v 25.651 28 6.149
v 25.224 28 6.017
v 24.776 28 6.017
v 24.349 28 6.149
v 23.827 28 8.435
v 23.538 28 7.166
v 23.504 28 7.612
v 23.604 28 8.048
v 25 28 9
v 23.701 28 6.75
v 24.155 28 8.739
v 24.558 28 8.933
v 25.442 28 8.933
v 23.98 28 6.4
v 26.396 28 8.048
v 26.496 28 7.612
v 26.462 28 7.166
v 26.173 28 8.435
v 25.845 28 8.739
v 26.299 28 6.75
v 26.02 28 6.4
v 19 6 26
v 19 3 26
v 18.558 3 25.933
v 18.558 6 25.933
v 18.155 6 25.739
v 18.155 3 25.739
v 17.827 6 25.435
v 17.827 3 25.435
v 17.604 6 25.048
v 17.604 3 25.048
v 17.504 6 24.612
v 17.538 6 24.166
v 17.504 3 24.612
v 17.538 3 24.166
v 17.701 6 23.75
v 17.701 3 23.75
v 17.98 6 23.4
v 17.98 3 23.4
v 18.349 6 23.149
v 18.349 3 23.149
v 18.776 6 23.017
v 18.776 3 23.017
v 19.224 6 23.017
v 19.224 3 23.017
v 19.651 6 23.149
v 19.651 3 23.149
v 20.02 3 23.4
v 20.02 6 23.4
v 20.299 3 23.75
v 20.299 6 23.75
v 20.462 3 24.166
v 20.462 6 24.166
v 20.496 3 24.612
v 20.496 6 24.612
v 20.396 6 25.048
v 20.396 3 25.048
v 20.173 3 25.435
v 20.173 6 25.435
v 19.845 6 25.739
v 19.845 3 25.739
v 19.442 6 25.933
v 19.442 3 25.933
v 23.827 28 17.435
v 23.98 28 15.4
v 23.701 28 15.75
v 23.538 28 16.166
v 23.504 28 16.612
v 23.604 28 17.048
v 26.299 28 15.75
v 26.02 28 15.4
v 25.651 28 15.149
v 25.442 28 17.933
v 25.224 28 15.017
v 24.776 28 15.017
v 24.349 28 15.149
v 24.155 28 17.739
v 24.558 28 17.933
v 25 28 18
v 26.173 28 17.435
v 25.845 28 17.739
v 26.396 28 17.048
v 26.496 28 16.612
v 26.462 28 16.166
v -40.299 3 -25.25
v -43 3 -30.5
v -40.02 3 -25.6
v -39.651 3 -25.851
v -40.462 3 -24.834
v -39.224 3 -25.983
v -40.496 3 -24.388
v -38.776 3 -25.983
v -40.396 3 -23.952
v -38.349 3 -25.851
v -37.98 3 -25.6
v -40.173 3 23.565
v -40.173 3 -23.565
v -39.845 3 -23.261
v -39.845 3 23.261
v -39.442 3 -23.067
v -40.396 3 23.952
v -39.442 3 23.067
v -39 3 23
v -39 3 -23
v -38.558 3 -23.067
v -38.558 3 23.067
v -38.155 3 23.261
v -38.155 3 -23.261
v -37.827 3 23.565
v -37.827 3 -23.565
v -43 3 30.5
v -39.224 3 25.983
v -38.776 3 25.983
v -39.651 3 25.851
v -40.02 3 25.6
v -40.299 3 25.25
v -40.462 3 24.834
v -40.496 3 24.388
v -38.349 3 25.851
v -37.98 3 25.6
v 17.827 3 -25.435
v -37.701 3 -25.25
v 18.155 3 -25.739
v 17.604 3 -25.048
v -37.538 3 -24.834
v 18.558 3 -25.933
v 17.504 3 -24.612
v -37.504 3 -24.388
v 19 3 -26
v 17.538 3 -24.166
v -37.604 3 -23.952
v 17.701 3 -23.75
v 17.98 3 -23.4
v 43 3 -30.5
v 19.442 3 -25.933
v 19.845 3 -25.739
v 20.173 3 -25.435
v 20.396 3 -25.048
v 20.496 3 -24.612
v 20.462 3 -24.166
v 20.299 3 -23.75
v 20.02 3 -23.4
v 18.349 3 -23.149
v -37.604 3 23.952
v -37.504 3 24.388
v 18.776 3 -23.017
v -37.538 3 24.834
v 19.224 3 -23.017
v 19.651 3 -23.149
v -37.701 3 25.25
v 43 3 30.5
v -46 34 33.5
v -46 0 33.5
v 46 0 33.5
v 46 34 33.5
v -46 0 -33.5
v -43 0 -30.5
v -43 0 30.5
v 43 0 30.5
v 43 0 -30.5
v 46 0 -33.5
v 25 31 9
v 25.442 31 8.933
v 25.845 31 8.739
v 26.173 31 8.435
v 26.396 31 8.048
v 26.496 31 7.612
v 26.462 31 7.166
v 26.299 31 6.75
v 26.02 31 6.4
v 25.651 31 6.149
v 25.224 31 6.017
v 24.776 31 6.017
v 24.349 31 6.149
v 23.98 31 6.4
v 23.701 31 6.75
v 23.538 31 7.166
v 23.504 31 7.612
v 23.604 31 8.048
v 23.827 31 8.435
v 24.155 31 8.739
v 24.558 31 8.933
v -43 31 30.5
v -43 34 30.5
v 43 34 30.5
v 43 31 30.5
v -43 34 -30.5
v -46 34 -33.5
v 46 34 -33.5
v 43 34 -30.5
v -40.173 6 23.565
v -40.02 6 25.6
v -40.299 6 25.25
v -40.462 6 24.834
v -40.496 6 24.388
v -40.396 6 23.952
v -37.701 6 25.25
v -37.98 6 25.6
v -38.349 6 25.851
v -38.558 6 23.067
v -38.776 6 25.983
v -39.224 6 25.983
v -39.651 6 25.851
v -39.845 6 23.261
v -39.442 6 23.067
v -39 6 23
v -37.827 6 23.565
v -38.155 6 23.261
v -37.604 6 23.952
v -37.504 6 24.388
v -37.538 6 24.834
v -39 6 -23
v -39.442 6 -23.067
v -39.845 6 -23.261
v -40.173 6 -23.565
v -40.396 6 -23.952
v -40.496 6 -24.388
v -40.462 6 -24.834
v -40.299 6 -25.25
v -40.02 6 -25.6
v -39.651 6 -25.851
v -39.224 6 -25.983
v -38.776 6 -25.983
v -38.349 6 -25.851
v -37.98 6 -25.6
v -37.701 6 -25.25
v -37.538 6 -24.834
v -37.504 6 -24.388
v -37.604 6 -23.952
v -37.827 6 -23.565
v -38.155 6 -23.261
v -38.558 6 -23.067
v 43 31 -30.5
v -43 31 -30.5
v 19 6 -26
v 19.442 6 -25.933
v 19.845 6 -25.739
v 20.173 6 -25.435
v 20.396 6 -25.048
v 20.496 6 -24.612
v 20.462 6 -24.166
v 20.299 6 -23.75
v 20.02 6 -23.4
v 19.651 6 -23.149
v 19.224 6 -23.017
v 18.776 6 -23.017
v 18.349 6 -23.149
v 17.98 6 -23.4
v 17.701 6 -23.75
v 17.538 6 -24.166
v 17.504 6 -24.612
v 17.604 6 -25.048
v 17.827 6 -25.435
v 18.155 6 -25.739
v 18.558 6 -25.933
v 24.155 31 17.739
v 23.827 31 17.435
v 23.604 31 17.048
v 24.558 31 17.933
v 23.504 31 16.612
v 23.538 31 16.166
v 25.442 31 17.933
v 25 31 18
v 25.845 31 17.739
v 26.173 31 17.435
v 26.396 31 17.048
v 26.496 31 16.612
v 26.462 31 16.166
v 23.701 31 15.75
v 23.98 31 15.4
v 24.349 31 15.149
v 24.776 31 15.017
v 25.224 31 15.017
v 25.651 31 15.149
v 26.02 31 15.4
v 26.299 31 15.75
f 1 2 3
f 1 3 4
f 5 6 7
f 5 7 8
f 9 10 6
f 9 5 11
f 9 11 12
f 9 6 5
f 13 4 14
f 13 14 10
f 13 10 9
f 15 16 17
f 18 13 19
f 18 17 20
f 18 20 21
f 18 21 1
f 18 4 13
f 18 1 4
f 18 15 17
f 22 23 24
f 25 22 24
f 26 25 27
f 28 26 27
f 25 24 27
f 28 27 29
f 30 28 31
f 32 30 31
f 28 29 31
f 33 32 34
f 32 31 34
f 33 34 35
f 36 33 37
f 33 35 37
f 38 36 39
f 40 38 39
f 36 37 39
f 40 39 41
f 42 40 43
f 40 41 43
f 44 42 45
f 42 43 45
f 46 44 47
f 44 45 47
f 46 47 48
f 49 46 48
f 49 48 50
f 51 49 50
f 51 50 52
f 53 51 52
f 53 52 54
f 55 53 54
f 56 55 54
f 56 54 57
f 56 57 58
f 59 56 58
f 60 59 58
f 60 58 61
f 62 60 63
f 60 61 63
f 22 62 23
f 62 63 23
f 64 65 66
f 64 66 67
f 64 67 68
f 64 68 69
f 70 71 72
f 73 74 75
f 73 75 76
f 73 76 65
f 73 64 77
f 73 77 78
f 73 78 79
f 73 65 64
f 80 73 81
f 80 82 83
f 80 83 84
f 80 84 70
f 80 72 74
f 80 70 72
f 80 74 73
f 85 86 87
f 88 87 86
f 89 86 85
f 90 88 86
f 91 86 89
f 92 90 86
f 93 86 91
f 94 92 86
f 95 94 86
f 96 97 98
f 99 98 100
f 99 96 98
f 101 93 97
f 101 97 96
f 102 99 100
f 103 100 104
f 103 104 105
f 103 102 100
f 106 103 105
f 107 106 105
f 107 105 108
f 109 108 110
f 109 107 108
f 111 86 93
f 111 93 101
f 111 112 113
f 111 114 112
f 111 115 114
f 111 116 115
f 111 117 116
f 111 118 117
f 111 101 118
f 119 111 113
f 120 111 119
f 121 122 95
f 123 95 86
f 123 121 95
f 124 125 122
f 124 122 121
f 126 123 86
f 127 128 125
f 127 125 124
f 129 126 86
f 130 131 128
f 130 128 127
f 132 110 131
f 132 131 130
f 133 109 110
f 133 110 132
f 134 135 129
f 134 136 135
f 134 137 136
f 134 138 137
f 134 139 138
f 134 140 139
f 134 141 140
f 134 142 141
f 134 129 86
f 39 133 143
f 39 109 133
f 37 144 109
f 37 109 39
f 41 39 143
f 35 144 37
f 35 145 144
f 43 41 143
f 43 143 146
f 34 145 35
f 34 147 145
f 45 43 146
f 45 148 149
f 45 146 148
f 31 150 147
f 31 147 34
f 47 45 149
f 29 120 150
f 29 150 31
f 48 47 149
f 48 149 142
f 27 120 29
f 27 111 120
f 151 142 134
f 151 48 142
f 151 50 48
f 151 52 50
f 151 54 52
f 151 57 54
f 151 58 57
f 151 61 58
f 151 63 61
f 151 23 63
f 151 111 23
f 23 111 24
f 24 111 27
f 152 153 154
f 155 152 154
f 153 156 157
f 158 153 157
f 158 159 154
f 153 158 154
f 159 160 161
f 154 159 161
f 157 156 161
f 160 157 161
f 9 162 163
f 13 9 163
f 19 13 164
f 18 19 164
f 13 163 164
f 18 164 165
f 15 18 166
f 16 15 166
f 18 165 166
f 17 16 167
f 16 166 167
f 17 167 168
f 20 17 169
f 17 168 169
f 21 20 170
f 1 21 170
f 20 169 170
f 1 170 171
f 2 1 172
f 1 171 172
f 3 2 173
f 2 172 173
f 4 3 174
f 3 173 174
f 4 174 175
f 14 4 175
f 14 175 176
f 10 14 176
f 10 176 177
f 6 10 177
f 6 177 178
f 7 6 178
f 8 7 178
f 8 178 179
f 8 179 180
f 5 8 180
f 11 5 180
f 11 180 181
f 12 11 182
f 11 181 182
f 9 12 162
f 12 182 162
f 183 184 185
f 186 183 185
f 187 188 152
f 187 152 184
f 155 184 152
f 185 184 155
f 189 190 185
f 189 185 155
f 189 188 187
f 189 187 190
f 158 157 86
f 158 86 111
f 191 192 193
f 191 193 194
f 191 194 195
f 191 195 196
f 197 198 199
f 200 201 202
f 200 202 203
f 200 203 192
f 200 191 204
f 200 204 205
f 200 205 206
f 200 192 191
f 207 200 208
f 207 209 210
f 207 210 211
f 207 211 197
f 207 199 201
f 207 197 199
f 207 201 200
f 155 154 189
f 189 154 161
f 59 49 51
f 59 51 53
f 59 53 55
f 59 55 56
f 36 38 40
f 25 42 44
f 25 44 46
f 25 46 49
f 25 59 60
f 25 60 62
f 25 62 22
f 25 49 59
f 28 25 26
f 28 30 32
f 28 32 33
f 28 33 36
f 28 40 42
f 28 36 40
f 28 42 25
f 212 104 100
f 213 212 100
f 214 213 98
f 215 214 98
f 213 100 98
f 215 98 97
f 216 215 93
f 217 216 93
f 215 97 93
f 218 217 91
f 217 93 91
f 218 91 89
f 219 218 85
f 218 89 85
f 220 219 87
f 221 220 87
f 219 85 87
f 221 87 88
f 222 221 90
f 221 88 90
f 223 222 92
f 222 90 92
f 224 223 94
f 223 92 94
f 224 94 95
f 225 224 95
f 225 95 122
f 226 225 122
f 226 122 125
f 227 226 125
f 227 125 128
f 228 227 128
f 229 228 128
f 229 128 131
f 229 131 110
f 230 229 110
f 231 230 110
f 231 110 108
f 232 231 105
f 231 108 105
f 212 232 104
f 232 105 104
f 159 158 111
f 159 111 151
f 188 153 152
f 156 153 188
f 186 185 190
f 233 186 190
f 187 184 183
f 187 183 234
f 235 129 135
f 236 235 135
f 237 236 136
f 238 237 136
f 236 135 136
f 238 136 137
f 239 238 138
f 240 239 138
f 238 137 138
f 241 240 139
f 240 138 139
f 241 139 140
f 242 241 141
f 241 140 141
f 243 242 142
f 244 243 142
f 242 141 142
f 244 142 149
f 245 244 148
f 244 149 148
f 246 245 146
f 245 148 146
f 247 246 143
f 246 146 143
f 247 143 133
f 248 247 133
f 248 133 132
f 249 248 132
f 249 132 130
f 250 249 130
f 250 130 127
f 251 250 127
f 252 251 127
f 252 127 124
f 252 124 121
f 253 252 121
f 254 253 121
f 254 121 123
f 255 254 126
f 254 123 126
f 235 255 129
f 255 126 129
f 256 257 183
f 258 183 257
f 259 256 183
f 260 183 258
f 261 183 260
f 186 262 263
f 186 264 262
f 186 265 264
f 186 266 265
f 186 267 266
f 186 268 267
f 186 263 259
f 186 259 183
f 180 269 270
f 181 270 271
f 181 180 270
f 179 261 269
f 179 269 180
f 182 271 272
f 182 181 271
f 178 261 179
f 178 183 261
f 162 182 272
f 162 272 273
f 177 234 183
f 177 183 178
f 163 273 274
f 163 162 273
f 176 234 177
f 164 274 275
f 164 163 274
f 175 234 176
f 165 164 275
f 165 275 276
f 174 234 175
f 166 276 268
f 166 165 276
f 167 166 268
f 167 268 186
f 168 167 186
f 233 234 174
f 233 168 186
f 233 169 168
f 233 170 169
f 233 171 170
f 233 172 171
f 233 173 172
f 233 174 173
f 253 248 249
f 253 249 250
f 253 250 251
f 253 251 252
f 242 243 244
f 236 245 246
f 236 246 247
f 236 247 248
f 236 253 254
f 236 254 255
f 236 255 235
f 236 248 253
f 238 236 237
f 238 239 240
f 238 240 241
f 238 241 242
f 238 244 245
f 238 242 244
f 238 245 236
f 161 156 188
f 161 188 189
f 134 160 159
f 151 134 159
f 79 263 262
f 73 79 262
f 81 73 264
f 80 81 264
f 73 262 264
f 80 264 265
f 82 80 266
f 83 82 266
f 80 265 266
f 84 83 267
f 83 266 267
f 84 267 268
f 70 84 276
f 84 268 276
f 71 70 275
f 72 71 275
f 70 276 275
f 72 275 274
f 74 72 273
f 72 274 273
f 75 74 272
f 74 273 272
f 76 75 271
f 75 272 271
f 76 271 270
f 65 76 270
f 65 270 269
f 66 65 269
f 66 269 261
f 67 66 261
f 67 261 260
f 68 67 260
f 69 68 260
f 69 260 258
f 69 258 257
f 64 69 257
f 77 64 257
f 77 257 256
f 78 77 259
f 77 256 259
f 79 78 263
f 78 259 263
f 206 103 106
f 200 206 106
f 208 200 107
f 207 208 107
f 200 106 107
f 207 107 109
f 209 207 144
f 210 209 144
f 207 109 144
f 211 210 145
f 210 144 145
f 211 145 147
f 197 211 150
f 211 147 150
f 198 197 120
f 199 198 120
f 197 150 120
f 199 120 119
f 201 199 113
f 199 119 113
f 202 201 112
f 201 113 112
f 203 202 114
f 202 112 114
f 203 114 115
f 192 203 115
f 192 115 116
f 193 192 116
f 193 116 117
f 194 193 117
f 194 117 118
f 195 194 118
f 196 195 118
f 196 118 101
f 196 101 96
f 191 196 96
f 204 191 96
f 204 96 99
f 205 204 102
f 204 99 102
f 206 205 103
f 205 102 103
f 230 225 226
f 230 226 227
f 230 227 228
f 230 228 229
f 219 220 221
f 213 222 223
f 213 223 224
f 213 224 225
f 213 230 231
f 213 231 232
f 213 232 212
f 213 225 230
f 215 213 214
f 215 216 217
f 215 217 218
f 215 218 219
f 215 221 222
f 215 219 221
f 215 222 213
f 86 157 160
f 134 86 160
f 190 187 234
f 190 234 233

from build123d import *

# Parameters (mm, degrees)
SKETCH_1_W          = 92
SKETCH_1_H          = 67
EXTRUDE_1_DEPTH     = 34
SKETCH_2_W          = 86
SKETCH_2_H          = 61
CUT_EXTRUDE_1_DEPTH = 3
SKETCH_3_R          = 1.5
CUT_EXTRUDE_2_DEPTH = 3
SKETCH_4_W          = 86
SKETCH_4_H          = 61
CUT_EXTRUDE_3_DEPTH = 3
SKETCH_5_R          = 1.5
CUT_EXTRUDE_4_DEPTH = 3


with BuildPart() as part:
    # 草图1 → 凸台-拉伸1 (new body)
    with BuildSketch(Plane(origin=(0, 0, 0), x_dir=(1, 0, 0), z_dir=(0, 1, 0))):
        Rectangle(SKETCH_1_W, SKETCH_1_H)
    extrude(amount=EXTRUDE_1_DEPTH)

    # 草图2 → 切除-拉伸1 (cut)
    with BuildSketch(Plane(origin=(0, 34, 0), x_dir=(1, 0, 0), z_dir=(0, 1, 0))):
        Rectangle(SKETCH_2_W, SKETCH_2_H)
    extrude(amount=-CUT_EXTRUDE_1_DEPTH, mode=Mode.SUBTRACT)

    # 草图3 → 切除-拉伸2 (cut)
    with BuildSketch(Plane(origin=(0, 31, 0), x_dir=(1, 0, 0), z_dir=(0, 1, 0))):
        with Locations(Location((25, -16.5, 0), (0, 0, 270))):
            Circle(SKETCH_3_R)
        with Locations(Location((25, -7.5, 0), (0, 0, 270))):
            Circle(SKETCH_3_R)
    extrude(amount=-CUT_EXTRUDE_2_DEPTH, mode=Mode.SUBTRACT)

    # 草图4 → 切除-拉伸3 (cut)
    with BuildSketch(Plane.XZ):
        Rectangle(SKETCH_4_W, SKETCH_4_H)
    extrude(amount=-CUT_EXTRUDE_3_DEPTH, mode=Mode.SUBTRACT)

    # 草图5 → 切除-拉伸4 (cut)
    with BuildSketch(Plane.XZ.offset(-3)):
        with Locations(Location((-39, 24.5, 0), (0, 0, 270))):
            Circle(SKETCH_5_R)
        with Locations(Location((19, 24.5, 0), (0, 0, 90))):
            Circle(SKETCH_5_R)
        with Locations(Location((19, -24.5, 0), (0, 0, 270))):
            Circle(SKETCH_5_R)
        with Locations(Location((-39, -24.5, 0), (0, 0, 90))):
            Circle(SKETCH_5_R)
    extrude(amount=-CUT_EXTRUDE_4_DEPTH, mode=Mode.SUBTRACT)


solid = part.part
